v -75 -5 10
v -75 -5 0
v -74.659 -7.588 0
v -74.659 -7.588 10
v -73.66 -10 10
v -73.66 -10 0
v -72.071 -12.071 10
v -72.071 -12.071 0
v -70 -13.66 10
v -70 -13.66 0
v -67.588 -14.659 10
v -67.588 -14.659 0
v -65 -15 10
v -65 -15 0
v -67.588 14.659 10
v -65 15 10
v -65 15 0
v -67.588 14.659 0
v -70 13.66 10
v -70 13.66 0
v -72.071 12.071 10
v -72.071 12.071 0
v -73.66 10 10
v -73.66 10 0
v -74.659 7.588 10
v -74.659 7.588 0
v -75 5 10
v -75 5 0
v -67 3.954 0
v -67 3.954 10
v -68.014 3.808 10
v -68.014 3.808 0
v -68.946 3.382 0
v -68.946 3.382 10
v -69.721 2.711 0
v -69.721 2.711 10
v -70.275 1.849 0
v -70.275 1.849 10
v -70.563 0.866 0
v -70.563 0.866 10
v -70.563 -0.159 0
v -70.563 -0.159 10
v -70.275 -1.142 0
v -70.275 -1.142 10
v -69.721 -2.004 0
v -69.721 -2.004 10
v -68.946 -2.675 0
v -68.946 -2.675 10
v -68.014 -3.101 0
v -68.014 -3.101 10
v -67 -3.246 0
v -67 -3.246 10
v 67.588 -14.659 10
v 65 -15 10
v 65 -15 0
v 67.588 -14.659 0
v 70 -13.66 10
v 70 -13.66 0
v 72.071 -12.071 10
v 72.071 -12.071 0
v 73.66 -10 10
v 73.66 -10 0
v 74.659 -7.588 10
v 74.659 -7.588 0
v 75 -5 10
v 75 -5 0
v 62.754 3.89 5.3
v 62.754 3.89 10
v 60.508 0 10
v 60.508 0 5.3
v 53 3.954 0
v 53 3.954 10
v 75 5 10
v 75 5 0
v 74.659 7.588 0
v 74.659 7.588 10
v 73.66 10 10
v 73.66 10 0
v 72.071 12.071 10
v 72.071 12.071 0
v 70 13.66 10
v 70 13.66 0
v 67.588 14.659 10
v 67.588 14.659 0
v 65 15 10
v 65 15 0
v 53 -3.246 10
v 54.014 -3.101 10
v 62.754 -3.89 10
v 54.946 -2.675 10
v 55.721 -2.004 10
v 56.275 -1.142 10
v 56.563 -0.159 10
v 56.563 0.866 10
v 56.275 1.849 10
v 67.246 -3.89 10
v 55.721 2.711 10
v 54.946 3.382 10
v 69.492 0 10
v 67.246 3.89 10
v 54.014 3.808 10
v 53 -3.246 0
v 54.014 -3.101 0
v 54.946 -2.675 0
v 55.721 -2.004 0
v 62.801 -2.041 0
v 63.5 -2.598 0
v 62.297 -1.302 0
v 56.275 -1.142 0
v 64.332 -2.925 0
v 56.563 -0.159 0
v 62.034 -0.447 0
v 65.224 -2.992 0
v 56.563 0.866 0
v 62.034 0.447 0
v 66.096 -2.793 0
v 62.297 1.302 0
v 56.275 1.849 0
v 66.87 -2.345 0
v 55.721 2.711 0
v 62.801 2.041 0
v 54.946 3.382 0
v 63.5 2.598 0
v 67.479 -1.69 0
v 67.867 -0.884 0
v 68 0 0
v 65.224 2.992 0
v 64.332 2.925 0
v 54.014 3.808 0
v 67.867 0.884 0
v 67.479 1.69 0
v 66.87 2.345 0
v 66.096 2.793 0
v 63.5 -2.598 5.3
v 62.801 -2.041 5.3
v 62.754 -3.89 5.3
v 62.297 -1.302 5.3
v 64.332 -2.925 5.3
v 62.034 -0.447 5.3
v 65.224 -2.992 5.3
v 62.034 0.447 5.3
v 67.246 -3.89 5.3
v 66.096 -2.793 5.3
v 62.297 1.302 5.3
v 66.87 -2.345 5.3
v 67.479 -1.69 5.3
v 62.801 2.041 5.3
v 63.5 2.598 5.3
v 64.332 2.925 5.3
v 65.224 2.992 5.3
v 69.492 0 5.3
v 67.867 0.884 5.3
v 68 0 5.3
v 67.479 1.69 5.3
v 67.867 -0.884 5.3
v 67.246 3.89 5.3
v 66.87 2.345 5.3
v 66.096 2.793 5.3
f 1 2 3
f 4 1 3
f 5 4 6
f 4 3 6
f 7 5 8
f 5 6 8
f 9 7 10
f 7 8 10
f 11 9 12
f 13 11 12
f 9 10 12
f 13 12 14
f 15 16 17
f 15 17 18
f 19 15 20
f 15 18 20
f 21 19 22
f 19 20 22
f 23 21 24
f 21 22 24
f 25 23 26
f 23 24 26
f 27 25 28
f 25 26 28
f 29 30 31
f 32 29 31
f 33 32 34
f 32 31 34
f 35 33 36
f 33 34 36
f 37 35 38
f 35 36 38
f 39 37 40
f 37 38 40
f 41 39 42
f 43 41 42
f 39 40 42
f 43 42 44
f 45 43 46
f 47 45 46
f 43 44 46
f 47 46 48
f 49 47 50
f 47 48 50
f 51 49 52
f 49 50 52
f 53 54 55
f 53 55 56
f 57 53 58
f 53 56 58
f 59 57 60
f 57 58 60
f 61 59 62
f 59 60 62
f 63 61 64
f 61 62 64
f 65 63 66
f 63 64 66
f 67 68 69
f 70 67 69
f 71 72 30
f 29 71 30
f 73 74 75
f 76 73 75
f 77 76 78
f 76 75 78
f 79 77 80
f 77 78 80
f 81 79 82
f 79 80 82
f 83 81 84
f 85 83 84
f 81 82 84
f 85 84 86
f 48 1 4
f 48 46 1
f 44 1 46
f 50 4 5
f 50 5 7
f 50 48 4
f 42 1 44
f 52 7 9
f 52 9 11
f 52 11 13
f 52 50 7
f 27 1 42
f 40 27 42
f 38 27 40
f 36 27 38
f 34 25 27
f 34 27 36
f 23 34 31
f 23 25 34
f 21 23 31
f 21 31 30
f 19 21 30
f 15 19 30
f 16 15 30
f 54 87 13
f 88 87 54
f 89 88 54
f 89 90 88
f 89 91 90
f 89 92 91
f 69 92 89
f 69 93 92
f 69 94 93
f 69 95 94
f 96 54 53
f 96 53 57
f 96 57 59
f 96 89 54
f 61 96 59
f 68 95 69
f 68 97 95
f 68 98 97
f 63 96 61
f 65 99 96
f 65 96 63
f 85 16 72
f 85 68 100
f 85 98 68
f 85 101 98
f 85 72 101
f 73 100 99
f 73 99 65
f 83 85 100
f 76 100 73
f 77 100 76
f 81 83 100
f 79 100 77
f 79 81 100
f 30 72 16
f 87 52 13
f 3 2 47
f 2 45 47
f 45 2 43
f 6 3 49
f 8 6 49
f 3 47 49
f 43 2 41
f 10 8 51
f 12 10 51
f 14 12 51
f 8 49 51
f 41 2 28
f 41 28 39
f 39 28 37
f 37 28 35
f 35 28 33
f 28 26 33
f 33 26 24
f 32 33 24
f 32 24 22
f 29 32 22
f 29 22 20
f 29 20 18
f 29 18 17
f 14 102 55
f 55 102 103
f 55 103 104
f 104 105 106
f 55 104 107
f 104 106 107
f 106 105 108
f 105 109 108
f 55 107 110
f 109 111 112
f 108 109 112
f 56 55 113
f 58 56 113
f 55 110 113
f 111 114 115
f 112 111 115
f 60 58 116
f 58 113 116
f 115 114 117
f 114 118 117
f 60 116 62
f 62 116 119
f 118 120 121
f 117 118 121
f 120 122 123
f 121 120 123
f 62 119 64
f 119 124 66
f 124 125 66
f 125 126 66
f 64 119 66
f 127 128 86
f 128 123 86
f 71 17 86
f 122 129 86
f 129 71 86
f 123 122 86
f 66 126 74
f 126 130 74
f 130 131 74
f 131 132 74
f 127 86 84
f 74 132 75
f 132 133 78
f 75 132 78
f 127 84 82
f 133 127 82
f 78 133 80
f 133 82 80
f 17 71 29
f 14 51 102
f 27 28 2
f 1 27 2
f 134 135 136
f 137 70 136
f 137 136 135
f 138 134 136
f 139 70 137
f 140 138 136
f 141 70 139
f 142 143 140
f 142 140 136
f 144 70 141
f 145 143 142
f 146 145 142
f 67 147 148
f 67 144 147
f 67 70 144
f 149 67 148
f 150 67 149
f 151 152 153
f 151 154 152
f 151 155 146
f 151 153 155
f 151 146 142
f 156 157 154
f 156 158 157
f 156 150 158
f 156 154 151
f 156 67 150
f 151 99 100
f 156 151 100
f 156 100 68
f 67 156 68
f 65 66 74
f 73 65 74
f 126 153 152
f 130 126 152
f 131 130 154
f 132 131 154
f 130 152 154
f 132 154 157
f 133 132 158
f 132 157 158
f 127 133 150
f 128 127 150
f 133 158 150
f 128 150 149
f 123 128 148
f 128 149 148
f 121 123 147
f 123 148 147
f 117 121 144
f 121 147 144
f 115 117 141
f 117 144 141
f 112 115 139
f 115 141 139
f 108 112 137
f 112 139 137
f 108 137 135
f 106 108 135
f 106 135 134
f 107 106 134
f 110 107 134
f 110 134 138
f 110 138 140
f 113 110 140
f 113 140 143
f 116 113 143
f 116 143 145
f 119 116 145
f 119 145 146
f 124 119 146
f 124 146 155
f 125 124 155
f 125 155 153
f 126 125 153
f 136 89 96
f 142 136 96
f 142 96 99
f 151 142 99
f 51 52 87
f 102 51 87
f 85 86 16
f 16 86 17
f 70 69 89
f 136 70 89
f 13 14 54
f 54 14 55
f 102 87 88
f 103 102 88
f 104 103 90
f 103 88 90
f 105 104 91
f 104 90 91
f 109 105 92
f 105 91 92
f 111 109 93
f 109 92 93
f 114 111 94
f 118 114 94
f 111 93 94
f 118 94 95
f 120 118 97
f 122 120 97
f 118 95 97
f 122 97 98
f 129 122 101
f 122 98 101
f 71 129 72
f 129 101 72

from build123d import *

# Parameters (mm, degrees)
F1_DEPTH = 10
F2_R     = 3
F3_DEPTH = 10.001
F5_DEPTH = 4.7


with BuildPart() as f1:
    # F0 (on Top) → F1 (new body)
    with BuildSketch(Plane.XY):
        with BuildLine():
            ThreePointArc((-75, -5), (-72.071068, -12.071068), (-65, -15))
            Line((-65, -15), (65, -15))
            ThreePointArc((65, -15), (72.071068, -12.071068), (75, -5))
            Line((75, -5), (75, 5))
            ThreePointArc((75, 5), (72.071068, 12.071068), (65, 15))
            Line((65, 15), (-65, 15))
            ThreePointArc((-65, 15), (-72.071068, 12.071068), (-75, 5))
            Line((-75, 5), (-75, -5))
        make_face()
    extrude(amount=F1_DEPTH)

    # F2 (on face) → F3 (cut, through all)
    with BuildSketch(Plane.XY.offset(10)):
        with Locations((65, 0)):
            Circle(F2_R)
        with BuildLine():
            Line((53, 3.953533), (-67, 3.953533))
            ThreePointArc((-67, 3.953533), (-70.6, 0.353533), (-67, -3.246467))
            Line((-67, -3.246467), (53, -3.246467))
            ThreePointArc((53, -3.246467), (56.6, 0.353533), (53, 3.953533))
        make_face()
    extrude(amount=-F3_DEPTH, mode=Mode.SUBTRACT)

    # F4 (on face) → F5 (cut)
    with BuildSketch(Plane.XY.offset(10)):
        Polygon((62.754107, -3.89), (67.245893, -3.89), (69.491785, 0), (67.245893, 3.89), (62.754107, 3.89), (60.508215, 0), align=None)
    extrude(amount=-F5_DEPTH, mode=Mode.SUBTRACT)


solid = f1.part
